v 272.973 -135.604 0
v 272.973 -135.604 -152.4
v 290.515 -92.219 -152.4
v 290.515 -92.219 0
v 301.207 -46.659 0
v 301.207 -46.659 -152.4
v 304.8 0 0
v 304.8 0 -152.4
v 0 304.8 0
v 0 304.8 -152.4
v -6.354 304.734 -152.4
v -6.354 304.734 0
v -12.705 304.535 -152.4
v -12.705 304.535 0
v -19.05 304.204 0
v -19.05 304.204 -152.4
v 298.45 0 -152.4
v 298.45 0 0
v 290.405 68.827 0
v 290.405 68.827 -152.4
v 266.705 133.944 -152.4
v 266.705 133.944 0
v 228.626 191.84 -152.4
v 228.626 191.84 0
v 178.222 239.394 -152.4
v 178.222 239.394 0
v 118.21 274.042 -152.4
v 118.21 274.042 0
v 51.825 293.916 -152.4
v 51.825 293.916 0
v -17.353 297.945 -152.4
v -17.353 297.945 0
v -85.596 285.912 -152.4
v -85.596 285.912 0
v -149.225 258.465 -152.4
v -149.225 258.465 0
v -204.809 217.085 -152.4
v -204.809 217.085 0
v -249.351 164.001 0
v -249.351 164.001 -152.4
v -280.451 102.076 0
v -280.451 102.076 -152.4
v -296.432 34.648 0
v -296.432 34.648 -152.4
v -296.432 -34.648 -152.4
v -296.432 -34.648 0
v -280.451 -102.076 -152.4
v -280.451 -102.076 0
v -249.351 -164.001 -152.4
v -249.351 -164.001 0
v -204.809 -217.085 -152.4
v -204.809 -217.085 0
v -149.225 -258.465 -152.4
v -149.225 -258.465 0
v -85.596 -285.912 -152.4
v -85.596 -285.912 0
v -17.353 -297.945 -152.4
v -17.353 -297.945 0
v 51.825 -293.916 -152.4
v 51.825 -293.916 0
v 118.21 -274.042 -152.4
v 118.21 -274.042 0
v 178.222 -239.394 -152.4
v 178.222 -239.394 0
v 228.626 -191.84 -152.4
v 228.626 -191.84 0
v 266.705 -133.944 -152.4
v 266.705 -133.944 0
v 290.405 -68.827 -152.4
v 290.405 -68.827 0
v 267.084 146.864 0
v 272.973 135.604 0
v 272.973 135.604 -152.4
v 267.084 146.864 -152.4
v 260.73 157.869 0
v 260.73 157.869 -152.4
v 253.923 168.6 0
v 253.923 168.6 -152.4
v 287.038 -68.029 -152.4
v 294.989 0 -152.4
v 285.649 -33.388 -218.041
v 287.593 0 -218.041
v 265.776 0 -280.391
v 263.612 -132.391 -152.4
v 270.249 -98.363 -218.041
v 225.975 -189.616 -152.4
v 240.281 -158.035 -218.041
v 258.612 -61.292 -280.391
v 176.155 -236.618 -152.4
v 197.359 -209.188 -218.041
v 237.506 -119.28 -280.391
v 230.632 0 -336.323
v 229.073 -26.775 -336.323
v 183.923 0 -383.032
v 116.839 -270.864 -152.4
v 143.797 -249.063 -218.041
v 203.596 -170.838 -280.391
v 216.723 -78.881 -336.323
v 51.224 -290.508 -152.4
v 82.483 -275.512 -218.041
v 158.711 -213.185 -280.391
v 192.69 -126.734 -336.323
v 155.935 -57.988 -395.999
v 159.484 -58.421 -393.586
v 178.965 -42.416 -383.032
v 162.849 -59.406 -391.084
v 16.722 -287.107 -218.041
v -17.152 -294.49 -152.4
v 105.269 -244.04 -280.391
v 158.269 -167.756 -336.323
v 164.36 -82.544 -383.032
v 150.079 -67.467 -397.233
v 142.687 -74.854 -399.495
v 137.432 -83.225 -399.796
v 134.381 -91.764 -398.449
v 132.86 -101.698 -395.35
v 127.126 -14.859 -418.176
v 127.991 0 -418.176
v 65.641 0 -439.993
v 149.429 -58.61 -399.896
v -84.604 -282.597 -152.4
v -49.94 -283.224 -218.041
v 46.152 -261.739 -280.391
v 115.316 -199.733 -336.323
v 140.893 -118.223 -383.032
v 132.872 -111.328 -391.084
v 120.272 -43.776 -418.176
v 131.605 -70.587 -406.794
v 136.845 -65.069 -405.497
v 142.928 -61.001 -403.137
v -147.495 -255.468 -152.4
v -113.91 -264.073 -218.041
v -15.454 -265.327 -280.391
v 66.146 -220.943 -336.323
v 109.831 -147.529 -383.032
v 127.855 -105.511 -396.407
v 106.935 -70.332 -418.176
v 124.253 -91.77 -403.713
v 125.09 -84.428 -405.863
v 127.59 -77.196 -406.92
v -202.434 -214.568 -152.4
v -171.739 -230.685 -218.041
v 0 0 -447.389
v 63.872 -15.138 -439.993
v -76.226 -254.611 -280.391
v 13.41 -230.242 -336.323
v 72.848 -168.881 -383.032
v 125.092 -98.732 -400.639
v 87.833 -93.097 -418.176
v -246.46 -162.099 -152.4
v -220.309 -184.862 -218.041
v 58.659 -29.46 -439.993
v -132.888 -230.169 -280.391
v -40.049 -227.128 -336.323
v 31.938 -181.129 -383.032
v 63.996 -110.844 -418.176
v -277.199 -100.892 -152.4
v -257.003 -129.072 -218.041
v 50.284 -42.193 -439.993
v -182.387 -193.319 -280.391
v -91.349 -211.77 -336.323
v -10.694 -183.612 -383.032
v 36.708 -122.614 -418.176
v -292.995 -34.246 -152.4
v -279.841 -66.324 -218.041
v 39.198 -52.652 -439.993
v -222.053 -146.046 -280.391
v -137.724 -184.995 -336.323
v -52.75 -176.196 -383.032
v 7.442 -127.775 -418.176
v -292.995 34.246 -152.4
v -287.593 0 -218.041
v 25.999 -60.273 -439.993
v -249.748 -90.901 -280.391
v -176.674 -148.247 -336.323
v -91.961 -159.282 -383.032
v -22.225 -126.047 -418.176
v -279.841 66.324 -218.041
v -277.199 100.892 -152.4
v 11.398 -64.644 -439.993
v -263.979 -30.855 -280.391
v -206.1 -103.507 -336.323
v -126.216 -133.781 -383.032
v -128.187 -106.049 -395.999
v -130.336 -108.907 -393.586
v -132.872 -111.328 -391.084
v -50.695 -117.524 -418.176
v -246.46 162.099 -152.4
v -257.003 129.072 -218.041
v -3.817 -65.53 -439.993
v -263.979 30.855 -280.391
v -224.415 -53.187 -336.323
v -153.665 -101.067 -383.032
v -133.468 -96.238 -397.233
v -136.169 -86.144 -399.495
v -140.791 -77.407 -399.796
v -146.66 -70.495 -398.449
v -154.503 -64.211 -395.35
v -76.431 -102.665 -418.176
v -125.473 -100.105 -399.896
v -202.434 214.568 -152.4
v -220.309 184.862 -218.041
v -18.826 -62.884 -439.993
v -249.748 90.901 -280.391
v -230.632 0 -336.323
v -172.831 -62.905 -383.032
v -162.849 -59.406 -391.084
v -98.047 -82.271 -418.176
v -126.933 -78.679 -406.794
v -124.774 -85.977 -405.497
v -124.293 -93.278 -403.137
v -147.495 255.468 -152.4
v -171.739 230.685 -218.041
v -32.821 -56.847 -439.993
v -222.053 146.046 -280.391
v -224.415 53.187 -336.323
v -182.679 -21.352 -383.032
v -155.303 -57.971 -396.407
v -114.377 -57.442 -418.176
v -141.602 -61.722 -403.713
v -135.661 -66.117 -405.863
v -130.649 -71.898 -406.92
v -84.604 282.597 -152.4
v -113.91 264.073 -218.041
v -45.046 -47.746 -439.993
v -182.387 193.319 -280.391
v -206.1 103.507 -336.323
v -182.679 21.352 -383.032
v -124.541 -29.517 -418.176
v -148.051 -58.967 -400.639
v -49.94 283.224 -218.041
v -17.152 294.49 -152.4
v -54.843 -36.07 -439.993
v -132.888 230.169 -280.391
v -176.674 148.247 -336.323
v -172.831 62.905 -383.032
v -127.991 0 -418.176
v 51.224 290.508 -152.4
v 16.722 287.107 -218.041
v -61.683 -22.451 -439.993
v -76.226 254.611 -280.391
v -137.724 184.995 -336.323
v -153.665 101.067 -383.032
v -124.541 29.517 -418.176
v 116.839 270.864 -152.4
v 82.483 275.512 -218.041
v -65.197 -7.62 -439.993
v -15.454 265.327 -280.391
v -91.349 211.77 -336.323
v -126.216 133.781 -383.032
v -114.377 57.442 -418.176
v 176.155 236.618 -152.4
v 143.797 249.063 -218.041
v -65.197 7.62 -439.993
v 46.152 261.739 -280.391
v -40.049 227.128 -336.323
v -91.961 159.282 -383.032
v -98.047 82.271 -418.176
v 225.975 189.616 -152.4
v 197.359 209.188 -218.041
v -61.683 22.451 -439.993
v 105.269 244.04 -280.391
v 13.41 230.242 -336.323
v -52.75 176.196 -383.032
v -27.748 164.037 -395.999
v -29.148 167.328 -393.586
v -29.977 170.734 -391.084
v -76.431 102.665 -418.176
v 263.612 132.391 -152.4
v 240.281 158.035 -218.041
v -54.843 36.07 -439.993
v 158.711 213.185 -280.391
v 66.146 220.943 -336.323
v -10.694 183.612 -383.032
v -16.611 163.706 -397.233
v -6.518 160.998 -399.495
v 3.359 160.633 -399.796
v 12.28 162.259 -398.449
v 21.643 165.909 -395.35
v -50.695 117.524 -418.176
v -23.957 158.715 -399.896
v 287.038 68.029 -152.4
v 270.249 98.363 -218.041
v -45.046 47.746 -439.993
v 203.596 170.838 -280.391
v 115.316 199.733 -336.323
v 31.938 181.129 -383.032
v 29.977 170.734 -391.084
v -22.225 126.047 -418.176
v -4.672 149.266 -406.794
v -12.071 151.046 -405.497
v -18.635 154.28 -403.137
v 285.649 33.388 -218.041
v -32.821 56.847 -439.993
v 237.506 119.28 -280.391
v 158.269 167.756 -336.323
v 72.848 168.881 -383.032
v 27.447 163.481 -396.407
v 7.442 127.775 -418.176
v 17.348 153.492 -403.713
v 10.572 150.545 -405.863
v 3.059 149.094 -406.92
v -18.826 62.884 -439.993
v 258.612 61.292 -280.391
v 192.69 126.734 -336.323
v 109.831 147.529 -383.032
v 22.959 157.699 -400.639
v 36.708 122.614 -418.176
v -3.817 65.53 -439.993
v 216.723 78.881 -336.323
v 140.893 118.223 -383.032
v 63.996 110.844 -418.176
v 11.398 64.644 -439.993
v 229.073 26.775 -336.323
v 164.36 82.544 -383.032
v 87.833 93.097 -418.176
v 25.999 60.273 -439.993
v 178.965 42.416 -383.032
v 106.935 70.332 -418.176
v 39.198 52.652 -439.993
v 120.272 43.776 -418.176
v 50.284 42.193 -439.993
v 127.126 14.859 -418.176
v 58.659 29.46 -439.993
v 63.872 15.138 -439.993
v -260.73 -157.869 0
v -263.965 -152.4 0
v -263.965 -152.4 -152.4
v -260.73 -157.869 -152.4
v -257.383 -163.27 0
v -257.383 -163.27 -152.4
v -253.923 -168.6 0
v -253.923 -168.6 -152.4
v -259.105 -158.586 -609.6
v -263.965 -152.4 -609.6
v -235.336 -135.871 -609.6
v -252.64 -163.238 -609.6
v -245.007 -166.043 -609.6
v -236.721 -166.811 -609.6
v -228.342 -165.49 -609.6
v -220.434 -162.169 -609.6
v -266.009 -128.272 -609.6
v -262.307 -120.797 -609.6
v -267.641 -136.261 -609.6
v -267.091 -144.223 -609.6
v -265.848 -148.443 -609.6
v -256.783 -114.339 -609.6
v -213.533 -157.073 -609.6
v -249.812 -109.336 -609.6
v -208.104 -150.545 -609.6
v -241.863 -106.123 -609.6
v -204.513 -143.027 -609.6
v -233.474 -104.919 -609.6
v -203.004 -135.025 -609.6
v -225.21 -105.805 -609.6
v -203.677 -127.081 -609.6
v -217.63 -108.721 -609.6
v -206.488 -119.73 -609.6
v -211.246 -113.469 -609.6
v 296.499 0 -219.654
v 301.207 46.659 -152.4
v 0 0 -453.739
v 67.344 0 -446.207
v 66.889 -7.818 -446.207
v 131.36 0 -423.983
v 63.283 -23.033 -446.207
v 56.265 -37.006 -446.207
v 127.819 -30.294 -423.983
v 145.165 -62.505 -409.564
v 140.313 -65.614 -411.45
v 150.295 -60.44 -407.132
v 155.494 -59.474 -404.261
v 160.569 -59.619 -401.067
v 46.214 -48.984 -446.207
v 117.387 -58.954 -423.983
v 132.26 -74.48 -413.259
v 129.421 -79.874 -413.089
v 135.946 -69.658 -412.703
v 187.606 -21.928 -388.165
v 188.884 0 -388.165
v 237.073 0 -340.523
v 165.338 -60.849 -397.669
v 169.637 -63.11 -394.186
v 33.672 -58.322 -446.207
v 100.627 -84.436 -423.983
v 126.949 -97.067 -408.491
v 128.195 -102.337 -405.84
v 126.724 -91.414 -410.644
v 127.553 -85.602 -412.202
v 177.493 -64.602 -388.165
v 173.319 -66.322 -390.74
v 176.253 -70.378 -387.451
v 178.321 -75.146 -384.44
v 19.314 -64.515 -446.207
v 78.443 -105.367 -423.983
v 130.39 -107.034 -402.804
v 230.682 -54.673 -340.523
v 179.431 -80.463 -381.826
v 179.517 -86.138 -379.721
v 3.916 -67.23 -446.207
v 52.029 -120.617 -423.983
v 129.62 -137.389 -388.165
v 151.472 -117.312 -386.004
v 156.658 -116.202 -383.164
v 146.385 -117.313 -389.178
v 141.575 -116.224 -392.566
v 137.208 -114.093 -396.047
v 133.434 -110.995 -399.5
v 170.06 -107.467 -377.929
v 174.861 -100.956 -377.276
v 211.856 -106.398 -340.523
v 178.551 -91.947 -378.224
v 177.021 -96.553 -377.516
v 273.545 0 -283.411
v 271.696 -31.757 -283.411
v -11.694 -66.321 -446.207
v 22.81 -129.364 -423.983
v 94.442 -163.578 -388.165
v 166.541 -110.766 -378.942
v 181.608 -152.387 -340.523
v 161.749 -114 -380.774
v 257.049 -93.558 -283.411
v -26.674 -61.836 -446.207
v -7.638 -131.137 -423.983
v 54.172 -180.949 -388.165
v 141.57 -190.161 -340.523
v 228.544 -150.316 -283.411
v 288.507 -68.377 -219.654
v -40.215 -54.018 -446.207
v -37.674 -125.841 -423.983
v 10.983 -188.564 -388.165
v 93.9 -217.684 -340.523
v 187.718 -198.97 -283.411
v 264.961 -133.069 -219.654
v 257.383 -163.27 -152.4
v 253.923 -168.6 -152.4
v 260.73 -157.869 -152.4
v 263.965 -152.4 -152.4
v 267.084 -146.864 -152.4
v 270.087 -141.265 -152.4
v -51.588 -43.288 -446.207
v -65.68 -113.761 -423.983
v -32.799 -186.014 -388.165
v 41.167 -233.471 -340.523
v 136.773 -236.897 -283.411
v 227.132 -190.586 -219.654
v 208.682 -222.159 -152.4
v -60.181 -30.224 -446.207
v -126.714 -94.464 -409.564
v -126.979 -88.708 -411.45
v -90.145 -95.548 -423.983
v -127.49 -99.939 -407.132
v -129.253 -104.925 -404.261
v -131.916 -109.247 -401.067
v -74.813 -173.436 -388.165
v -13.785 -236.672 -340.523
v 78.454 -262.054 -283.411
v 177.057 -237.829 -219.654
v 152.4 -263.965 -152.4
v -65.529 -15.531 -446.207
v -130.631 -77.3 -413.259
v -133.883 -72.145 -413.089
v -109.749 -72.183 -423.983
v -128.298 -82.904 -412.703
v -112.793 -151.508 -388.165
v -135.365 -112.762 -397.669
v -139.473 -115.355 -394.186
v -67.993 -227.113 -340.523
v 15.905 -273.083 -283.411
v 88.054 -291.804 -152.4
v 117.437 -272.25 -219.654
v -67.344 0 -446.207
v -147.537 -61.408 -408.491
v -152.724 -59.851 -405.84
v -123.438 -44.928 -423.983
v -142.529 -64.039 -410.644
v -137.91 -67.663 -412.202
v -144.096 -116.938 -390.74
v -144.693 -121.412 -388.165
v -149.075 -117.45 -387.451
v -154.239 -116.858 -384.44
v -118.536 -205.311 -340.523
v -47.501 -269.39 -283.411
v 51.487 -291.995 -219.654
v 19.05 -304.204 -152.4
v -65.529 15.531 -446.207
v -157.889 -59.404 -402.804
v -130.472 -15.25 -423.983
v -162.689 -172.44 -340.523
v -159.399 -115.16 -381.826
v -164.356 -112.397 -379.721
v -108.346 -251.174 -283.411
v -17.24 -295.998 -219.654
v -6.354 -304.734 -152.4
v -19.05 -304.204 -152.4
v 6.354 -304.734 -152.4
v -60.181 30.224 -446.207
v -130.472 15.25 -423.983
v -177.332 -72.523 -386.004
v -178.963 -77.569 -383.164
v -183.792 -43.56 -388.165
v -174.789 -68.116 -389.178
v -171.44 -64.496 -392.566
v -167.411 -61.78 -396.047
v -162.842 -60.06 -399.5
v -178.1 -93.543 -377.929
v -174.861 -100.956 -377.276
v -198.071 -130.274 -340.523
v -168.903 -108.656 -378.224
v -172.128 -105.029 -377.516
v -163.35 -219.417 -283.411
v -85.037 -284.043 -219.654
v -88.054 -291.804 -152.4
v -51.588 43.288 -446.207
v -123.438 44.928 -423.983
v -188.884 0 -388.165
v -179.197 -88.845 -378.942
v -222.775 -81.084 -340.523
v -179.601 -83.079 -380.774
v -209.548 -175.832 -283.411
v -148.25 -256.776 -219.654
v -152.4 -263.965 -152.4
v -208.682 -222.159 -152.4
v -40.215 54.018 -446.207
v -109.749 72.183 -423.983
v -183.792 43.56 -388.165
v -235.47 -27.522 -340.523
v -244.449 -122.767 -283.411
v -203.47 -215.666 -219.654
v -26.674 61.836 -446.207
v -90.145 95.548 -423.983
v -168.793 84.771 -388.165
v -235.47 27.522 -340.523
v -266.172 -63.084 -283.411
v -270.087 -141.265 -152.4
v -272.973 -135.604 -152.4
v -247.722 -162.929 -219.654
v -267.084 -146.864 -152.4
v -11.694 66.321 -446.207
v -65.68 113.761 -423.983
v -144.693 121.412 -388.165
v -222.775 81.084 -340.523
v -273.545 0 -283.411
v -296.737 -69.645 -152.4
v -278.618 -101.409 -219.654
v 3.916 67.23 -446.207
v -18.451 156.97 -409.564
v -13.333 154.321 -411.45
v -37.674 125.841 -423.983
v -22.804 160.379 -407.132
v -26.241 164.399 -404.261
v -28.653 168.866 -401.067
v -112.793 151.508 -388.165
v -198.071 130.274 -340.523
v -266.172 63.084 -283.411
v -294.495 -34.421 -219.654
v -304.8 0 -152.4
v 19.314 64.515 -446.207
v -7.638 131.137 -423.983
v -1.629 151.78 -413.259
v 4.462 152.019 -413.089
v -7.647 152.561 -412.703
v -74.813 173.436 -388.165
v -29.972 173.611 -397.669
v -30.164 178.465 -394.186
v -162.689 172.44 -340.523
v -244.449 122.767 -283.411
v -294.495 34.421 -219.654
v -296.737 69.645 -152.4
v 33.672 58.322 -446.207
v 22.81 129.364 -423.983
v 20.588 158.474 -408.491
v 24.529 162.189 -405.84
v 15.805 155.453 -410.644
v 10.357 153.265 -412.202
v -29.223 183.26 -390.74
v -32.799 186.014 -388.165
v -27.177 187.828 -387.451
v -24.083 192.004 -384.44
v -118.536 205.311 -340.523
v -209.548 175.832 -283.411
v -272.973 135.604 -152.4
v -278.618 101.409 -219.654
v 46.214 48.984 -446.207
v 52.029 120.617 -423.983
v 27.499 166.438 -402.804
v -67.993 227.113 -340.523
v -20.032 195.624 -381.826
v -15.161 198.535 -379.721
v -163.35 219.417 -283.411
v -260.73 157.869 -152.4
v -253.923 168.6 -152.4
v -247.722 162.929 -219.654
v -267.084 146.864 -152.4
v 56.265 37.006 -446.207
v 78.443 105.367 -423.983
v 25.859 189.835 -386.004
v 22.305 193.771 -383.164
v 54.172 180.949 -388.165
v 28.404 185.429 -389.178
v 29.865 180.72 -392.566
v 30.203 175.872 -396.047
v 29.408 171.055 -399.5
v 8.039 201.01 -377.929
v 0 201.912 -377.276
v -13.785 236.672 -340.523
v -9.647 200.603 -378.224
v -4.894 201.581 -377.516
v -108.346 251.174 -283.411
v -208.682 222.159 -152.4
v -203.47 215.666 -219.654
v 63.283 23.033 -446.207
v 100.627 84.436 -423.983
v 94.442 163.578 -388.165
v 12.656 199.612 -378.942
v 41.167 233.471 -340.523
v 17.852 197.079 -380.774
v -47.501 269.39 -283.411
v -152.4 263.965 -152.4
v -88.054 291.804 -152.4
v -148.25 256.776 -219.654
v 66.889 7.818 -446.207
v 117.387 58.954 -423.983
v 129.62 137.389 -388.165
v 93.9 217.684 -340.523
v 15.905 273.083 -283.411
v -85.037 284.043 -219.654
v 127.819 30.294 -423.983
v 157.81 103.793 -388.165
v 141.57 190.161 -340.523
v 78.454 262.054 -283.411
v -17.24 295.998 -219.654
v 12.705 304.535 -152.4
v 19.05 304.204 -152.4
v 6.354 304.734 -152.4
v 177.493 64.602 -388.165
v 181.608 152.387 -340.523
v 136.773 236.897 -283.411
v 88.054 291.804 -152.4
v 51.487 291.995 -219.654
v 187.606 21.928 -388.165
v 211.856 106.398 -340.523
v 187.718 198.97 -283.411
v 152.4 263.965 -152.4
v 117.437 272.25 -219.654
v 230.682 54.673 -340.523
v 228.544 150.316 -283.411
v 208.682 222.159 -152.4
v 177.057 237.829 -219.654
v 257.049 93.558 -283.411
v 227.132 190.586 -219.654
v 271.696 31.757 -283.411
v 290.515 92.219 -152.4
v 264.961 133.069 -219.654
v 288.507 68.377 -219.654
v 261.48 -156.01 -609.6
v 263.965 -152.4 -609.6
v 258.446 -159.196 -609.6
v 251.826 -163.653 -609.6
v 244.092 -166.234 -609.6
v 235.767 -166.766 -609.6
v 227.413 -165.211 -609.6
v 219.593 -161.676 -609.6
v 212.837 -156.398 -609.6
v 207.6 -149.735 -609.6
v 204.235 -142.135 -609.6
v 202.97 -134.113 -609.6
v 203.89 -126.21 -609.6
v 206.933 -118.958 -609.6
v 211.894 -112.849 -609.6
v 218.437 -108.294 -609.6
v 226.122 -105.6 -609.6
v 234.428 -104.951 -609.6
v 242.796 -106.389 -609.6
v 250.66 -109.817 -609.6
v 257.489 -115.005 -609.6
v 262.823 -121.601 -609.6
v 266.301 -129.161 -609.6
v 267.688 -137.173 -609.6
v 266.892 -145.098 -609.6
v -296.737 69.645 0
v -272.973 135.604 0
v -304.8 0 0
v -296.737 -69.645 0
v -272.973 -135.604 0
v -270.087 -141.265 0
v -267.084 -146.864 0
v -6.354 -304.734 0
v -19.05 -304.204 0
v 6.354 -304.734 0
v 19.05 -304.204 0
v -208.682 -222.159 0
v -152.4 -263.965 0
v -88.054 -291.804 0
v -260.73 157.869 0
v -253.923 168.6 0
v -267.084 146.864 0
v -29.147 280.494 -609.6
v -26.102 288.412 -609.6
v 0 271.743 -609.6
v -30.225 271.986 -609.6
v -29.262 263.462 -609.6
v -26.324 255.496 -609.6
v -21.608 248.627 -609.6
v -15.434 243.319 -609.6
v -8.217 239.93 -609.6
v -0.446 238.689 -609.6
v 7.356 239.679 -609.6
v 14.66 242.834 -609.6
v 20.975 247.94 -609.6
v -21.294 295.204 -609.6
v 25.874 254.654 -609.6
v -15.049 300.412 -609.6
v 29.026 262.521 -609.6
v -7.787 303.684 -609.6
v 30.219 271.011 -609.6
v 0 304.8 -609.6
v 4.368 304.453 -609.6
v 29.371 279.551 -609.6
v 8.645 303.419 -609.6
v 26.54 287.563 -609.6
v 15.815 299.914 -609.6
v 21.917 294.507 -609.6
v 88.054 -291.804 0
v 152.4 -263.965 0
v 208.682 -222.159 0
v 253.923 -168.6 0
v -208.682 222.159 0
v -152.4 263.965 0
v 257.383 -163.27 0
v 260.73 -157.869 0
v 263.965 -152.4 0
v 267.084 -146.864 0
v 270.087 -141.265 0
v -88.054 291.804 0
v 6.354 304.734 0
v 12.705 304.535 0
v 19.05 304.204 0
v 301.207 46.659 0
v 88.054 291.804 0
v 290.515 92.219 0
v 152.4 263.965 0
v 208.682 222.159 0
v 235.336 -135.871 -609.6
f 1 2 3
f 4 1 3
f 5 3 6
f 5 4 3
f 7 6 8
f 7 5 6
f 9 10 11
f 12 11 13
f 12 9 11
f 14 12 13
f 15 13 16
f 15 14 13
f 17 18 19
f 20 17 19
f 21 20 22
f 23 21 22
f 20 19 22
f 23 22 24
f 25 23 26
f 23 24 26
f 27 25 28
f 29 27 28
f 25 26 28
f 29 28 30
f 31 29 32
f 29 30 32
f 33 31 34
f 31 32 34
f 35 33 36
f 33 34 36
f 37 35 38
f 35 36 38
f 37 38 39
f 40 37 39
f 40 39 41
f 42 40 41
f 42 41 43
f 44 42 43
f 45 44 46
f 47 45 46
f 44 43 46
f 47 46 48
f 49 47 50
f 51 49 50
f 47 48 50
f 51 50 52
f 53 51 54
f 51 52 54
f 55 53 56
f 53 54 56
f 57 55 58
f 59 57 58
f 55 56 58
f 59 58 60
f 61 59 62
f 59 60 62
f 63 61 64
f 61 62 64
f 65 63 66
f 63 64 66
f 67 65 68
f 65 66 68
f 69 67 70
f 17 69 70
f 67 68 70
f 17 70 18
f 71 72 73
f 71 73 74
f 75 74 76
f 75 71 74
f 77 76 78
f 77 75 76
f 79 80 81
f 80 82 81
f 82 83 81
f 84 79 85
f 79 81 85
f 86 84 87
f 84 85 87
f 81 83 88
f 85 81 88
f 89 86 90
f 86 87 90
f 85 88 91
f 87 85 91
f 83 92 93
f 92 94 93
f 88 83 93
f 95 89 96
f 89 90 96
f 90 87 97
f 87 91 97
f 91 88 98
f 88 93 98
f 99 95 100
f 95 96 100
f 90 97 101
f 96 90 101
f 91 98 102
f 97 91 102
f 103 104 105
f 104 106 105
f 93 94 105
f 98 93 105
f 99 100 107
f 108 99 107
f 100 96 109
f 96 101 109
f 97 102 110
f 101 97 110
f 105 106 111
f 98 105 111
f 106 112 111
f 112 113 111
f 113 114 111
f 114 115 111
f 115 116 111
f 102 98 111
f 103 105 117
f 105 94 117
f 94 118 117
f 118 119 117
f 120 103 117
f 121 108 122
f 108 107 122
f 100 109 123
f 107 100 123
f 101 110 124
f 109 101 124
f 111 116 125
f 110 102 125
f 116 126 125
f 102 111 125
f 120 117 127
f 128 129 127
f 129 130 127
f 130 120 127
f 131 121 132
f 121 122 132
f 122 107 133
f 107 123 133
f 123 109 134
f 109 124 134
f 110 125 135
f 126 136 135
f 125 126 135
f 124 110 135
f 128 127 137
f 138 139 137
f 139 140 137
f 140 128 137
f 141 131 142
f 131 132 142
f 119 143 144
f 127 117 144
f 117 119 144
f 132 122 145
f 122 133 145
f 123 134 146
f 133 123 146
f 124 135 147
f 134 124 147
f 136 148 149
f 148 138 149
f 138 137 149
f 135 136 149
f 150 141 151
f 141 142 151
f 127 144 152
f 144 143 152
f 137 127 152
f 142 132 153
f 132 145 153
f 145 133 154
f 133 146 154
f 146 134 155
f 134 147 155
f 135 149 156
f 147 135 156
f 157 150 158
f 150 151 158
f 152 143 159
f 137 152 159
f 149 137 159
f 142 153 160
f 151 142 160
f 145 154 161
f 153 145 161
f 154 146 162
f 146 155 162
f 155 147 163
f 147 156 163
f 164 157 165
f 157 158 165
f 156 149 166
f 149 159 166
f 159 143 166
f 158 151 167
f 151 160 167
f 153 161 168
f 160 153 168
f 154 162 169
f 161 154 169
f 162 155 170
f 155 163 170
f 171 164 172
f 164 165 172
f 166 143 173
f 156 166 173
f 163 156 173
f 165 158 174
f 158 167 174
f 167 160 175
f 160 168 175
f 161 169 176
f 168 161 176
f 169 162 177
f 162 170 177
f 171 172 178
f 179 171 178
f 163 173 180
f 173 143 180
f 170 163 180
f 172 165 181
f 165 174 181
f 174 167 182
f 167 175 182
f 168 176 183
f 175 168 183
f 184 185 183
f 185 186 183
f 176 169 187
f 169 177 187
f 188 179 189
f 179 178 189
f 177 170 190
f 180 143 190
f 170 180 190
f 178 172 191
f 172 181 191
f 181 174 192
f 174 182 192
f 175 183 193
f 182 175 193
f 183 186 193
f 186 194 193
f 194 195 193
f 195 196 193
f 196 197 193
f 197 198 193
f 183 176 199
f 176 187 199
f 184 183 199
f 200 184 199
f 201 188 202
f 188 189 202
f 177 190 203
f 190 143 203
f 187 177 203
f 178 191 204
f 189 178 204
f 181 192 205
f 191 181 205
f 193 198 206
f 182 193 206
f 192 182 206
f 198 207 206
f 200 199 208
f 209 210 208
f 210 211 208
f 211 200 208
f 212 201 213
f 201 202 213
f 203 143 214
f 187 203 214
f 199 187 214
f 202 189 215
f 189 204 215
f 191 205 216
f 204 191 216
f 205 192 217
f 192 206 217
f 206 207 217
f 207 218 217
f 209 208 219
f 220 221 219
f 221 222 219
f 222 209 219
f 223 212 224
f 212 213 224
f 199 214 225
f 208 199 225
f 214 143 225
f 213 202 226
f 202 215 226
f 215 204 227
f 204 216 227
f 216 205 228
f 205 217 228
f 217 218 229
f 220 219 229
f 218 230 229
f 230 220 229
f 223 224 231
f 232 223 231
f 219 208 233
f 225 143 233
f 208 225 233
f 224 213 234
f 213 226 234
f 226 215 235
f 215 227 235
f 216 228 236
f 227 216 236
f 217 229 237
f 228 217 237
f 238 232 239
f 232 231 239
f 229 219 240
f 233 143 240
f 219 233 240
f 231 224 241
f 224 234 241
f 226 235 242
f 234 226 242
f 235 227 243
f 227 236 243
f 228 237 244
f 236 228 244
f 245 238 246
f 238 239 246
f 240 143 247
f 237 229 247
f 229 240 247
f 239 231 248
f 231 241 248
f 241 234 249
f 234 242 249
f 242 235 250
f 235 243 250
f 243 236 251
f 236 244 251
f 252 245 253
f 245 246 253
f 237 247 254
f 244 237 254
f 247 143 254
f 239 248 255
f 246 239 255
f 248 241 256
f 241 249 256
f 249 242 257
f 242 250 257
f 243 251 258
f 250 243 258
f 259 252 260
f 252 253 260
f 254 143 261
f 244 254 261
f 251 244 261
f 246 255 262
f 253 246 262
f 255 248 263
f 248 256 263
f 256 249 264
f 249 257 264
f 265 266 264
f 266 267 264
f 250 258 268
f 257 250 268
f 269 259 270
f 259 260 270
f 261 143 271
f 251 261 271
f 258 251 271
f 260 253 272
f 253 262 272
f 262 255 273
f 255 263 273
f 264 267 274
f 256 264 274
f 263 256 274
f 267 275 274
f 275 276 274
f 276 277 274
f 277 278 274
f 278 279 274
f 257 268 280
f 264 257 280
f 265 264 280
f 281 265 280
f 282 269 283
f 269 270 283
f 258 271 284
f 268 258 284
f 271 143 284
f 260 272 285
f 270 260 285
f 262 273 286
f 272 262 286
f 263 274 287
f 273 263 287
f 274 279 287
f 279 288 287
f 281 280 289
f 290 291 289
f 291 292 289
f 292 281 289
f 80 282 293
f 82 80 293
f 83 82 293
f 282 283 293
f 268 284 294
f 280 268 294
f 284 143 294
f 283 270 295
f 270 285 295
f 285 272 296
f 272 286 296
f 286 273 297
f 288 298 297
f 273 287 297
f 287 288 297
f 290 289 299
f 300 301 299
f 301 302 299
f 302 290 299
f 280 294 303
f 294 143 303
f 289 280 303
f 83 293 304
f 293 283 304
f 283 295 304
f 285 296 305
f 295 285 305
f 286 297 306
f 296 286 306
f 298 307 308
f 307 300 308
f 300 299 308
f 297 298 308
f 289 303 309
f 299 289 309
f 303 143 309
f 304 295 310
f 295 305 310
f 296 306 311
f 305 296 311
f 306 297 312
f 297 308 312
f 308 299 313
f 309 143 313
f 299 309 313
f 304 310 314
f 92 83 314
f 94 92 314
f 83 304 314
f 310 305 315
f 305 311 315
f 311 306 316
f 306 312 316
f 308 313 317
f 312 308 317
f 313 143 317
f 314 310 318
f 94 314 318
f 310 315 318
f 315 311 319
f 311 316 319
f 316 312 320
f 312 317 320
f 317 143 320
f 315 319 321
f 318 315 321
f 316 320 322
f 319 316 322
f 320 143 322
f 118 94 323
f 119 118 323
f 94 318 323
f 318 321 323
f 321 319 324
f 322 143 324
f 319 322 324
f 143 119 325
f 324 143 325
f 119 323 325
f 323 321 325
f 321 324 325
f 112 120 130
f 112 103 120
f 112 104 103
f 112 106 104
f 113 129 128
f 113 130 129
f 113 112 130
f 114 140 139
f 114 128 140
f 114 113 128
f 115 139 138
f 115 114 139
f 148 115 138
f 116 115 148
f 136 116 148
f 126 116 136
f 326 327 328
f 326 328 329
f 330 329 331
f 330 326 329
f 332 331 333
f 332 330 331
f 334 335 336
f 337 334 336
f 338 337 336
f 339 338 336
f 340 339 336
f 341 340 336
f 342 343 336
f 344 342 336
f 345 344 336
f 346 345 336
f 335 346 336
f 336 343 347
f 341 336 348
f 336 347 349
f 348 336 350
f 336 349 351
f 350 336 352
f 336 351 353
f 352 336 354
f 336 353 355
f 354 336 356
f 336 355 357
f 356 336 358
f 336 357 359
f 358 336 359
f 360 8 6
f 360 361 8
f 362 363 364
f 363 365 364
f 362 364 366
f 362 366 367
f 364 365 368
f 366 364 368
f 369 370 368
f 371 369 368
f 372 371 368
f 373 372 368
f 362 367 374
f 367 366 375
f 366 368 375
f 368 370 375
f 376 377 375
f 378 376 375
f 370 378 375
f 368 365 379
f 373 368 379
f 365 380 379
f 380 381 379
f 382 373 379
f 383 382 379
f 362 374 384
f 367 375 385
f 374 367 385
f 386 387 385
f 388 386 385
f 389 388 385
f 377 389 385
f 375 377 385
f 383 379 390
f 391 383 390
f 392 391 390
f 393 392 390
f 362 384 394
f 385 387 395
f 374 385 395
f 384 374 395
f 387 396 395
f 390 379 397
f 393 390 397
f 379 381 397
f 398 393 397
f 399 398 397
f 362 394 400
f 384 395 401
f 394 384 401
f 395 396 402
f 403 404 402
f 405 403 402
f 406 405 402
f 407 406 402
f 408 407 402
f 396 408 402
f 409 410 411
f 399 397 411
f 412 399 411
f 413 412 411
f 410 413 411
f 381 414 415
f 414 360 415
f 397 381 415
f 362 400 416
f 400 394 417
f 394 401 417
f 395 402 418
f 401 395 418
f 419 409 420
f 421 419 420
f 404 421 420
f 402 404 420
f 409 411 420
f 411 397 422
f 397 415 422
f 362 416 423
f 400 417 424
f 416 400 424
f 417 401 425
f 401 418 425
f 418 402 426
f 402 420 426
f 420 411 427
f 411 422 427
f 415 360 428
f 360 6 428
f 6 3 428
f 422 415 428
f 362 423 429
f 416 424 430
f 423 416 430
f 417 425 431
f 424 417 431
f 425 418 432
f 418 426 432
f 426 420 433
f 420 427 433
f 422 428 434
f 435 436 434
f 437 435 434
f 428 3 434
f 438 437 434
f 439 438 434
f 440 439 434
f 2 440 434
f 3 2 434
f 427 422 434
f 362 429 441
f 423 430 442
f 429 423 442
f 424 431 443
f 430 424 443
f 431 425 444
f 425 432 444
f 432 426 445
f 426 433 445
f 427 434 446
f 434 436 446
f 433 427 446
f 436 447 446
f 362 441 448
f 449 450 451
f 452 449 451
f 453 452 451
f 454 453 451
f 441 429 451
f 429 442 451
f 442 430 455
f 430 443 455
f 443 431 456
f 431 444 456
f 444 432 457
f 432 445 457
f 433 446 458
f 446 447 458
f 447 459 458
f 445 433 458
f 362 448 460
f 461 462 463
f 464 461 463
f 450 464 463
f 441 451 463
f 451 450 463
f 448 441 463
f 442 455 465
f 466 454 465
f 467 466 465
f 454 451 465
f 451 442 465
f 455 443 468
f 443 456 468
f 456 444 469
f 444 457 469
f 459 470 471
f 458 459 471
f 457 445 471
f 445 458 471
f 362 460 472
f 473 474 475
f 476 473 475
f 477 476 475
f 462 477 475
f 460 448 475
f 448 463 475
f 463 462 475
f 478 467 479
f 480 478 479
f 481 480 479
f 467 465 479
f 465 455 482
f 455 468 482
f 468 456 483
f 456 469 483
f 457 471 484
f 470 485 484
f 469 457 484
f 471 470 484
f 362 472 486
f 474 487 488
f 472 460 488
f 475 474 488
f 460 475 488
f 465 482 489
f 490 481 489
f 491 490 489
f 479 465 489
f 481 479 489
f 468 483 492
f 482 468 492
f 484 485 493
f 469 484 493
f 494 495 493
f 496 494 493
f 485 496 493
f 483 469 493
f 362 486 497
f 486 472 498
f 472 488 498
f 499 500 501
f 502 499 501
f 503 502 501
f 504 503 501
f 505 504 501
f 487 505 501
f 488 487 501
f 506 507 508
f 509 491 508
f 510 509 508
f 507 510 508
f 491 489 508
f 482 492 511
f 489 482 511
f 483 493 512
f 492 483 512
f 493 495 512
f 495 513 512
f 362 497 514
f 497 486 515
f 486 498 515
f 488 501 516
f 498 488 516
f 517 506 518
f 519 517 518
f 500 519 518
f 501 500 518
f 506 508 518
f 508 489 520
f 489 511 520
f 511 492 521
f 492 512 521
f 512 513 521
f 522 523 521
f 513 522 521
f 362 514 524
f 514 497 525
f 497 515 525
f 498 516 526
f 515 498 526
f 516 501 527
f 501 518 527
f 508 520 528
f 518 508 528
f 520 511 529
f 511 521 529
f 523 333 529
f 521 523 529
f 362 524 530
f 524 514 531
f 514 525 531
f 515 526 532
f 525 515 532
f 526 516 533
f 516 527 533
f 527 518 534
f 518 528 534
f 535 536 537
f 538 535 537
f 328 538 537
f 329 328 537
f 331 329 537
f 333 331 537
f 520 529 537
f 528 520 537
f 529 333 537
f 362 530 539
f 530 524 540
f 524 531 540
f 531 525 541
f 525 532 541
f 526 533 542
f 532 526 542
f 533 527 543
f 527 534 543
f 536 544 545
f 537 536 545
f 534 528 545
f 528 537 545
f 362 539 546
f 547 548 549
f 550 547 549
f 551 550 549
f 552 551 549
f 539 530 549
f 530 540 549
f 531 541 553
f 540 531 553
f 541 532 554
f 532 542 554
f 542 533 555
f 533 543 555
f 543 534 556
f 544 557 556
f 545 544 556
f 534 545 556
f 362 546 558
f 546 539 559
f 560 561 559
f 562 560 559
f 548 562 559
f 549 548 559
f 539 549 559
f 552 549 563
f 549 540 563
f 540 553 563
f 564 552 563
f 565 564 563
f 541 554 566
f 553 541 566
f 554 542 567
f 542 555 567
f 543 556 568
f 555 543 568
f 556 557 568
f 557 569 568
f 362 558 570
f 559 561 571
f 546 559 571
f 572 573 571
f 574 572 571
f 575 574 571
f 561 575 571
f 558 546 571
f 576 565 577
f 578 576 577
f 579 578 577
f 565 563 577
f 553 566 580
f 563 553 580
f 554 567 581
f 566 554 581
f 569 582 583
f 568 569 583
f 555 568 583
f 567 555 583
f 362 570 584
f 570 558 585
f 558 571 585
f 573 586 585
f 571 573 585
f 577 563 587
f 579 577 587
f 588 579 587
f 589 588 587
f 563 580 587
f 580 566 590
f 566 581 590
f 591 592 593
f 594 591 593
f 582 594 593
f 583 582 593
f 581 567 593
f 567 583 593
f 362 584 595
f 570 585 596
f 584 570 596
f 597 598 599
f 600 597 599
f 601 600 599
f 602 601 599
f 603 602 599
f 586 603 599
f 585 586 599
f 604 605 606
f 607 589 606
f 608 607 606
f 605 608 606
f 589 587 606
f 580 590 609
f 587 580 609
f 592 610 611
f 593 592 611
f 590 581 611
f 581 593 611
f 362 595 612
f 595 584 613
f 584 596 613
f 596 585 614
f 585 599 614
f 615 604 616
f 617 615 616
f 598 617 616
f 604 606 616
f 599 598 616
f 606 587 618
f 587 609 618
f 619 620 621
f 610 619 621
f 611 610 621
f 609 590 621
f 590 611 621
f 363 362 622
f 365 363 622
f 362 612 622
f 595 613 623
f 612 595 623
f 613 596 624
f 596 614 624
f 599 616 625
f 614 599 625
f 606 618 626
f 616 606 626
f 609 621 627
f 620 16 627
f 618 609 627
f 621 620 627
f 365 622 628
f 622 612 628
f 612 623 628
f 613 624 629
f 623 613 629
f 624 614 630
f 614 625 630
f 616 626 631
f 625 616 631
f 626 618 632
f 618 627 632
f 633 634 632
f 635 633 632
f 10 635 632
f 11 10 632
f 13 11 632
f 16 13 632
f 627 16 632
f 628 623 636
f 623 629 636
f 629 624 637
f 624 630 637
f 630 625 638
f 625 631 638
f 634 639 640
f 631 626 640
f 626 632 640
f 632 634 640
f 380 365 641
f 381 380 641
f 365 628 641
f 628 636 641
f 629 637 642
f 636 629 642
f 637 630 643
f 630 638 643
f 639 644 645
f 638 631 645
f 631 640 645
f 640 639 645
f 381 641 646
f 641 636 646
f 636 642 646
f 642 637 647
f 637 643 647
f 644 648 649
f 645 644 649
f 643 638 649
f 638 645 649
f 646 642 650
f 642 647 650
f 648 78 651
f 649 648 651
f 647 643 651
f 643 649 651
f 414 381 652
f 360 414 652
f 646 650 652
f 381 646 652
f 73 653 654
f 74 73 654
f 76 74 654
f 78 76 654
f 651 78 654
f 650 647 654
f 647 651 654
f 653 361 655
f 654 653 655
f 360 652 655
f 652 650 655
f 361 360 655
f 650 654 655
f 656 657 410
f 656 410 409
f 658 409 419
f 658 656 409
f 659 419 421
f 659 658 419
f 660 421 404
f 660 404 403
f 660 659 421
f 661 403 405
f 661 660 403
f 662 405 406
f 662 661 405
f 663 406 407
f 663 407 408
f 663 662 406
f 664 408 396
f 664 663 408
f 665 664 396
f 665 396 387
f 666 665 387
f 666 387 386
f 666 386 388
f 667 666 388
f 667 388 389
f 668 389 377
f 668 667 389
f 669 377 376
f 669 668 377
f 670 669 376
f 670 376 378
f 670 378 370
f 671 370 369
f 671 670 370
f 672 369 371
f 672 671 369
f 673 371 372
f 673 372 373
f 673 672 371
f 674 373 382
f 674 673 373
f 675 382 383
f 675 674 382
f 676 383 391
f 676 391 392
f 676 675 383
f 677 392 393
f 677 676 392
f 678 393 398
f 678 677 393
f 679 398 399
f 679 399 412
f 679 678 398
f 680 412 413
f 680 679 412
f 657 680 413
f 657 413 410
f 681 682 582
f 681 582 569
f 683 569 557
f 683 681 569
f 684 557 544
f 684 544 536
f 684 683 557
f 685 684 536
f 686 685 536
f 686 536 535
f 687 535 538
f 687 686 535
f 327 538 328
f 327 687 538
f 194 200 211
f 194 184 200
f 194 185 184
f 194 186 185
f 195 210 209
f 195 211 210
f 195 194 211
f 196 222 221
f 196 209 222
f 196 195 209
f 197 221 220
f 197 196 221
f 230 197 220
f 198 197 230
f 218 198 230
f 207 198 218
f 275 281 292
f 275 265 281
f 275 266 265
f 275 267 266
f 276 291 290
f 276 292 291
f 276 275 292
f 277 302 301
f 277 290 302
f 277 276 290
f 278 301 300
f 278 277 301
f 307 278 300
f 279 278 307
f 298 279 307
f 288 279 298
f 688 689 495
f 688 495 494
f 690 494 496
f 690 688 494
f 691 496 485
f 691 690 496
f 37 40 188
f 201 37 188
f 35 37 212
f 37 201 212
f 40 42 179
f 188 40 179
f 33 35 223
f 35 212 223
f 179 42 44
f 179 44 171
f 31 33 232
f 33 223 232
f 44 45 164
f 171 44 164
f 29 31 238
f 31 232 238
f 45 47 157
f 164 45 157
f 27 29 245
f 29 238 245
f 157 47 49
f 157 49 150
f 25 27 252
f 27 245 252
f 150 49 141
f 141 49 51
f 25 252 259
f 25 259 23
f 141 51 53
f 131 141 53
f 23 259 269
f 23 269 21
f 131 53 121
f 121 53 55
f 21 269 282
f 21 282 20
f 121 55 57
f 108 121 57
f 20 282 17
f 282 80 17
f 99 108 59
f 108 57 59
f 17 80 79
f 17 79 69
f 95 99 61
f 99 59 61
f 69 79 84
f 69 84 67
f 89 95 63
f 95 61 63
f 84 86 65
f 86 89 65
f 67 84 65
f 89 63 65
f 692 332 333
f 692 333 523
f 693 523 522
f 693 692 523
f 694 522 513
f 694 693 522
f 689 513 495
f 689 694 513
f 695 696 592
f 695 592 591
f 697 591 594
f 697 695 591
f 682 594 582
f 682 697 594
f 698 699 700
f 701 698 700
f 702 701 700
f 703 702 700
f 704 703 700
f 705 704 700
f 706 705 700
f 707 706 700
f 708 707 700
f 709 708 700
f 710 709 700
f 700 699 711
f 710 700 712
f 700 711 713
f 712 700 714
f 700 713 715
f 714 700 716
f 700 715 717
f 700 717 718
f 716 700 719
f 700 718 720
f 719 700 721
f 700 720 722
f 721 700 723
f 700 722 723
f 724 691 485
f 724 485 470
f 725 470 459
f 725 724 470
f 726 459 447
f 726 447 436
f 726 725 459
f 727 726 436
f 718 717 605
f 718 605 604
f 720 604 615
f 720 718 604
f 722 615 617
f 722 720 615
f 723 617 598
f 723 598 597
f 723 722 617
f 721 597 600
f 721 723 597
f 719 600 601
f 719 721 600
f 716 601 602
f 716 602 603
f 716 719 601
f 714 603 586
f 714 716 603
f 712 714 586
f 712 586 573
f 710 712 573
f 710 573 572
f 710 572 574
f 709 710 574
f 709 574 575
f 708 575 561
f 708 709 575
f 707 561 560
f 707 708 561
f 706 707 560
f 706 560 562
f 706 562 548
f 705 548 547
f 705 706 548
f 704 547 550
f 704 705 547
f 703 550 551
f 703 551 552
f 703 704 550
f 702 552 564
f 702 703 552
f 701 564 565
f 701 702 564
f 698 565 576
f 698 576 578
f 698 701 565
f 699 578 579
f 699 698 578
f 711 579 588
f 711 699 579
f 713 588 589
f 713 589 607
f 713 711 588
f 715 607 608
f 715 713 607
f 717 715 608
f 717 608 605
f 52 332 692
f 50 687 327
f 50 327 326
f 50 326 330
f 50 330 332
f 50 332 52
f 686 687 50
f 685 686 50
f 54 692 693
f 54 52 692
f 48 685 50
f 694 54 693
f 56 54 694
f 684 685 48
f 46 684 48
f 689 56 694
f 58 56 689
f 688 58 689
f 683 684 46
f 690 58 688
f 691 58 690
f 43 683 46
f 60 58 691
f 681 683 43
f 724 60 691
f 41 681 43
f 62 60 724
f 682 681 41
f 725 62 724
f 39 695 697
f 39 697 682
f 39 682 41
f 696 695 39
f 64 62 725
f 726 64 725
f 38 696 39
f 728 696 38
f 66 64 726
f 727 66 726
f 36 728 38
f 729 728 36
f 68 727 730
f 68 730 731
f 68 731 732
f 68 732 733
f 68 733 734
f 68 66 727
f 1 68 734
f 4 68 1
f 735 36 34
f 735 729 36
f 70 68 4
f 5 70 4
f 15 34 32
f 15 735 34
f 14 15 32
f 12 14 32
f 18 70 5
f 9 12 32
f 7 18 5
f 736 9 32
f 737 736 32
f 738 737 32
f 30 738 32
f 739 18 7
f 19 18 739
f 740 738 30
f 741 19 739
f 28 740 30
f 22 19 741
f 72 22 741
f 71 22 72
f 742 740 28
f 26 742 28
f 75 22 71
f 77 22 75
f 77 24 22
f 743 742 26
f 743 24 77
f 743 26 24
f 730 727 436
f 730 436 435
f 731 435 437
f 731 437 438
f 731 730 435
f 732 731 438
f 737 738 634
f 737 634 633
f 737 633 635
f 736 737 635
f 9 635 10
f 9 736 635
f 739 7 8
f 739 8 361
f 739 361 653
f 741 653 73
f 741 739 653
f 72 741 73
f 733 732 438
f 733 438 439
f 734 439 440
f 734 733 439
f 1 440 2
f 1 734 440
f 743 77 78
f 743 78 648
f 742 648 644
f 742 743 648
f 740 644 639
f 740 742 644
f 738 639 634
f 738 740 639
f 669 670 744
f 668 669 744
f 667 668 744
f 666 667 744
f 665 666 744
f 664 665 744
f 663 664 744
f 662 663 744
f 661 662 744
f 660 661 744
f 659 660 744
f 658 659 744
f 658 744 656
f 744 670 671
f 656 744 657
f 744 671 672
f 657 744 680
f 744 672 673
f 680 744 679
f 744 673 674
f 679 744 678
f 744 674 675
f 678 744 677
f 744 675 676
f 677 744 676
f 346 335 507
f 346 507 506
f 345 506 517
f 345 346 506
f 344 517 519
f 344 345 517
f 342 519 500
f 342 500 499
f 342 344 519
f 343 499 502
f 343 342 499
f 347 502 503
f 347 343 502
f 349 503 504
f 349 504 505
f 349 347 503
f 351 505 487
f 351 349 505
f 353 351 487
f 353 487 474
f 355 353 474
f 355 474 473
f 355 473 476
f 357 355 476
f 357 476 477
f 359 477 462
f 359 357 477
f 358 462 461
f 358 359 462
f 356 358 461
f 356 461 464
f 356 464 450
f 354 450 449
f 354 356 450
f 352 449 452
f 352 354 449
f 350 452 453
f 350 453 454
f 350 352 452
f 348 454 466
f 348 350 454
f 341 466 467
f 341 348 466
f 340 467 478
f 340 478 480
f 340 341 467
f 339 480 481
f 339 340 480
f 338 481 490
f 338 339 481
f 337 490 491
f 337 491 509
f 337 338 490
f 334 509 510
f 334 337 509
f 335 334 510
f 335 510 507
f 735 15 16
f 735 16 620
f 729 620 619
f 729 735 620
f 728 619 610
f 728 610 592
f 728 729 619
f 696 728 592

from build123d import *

# Parameters (mm, degrees)
F0_R      = 298.45
F1_DEPTH  = 152.4
F11_W     = 1267.8290780676
F11_H     = 1016
F16_DEPTH = 76.2


with BuildPart() as f1:
    # F0 (on Top) → F1 (new body)
    with BuildSketch(Plane.XY):
        with BuildLine():
            ThreePointArc((272.9734828671, 135.6042685589), (263.9645430735, 152.4), (253.9234828671, 168.599836443))
            ThreePointArc((253.9234828671, 168.599836443), (152.4, 263.9645430735), (19.05, 304.2041050019))
            ThreePointArc((19.05, 304.2041050019), (9.5296588455, 304.6509898265), (0, 304.8))
            ThreePointArc((0, 304.8), (-9.5296588455, 304.6509898265), (-19.05, 304.2041050019))
            ThreePointArc((-19.05, 304.2041050019), (-152.4, 263.9645430735), (-253.9234828671, 168.599836443))
            ThreePointArc((-253.9234828671, 168.599836443), (-263.9645430735, 152.4), (-272.9734828671, 135.6042685589))
            ThreePointArc((-272.9734828671, 135.6042685589), (-304.8, 0), (-272.9734828671, -135.6042685589))
            ThreePointArc((-272.9734828671, -135.6042685589), (-268.6003259006, -144.0725682636), (-263.9645430735, -152.4))
            ThreePointArc((-263.9645430735, -152.4), (-259.0706670551, -160.5784215629), (-253.9234828671, -168.599836443))
            ThreePointArc((-253.9234828671, -168.599836443), (-152.4, -263.9645430735), (-19.05, -304.2041050019))
            ThreePointArc((-19.05, -304.2041050019), (0, -304.8), (19.05, -304.2041050019))
            ThreePointArc((19.05, -304.2041050019), (152.4, -263.9645430735), (253.9234828671, -168.599836443))
            ThreePointArc((253.9234828671, -168.599836443), (259.0706670551, -160.5784215629), (263.9645430735, -152.4))
            ThreePointArc((263.9645430735, -152.4), (268.6003259006, -144.0725682636), (272.9734828671, -135.6042685589))
            ThreePointArc((272.9734828671, -135.6042685589), (296.7367162805, -69.6445346818), (304.8, 0))
            ThreePointArc((304.8, 0), (296.7367162805, 69.6445346818), (272.9734828671, 135.6042685589))
        make_face()
        Circle(F0_R, mode=Mode.SUBTRACT)
    extrude(amount=-F1_DEPTH)

    # F2 (on Front) → F9 (revolve)
    with BuildSketch(Plane.XZ):
        with BuildLine():
            Line((0, -447.3894571287), (0, -453.7394571287))
            ThreePointArc((0, -453.7394571287), (214.306152748, -365.6868034652), (304.8, -152.4))
            Line((304.8, -152.4), (294.9894571287, -152.4))
            ThreePointArc((294.9894571287, -152.4), (208.5890455143, -360.9890455142), (0, -447.3894571287))
        make_face()
    revolve(axis=Axis((0, 0, -248.1805924326), (0, 0, -1)))

    # F8 (on face) → F12 (revolve)
    with BuildSketch(Plane(origin=(0, 0, 0), x_dir=(0, -1, 0), z_dir=(-1, 0, 0))):
        with BuildLine():
            Line((-201.9116809095, -377.2763831548), (-304.8, -609.6))
            Line((-304.8, -609.6), (-271.7425017268, -609.6))
            Line((-271.7425017268, -609.6), (-177.4761269208, -396.7448835454))
            ThreePointArc((-177.4761269208, -396.7448835454), (-189.9434989923, -387.3239083256), (-201.9116809095, -377.2763831548))
        make_face()
    revolve(axis=Axis((0, 136.6116201303, -304.4721153432), (0, 0.4049332191, -0.9143462627)))

    # F7 (on face) → F13 (revolve)
    with BuildSketch(Plane(origin=(0, 0, 0), x_dir=(-0.8660254038, 0.5, 0), z_dir=(0.5, 0.8660254038, 0))):
        with BuildLine():
            Line((-201.9116809095, -377.2763831548), (-304.8, -609.6))
            Line((-304.8, -609.6), (-271.7425017268, -609.6))
            Line((-271.7425017268, -609.6), (-177.4761269208, -396.7448835454))
            ThreePointArc((-177.4761269208, -396.7448835454), (-189.9434989923, -387.3239083256), (-201.9116809095, -377.2763831548))
        make_face()
    revolve(axis=Axis((118.309133485, -68.3058100652, -304.4721153432), (0.3506824545, -0.2024666095, -0.9143462627)))

    # F6 (on face) → F14 (revolve)
    with BuildSketch(Plane(origin=(0, 0, 0), x_dir=(0.8660254038, 0.5, 0), z_dir=(0.5, -0.8660254038, 0))):
        with BuildLine():
            Line((-201.9116809095, -377.2763831548), (-304.8, -609.6))
            Line((-304.8, -609.6), (-271.7425017268, -609.6))
            Line((-271.7425017268, -609.6), (-177.4761269208, -396.7448835454))
            ThreePointArc((-177.4761269208, -396.7448835454), (-189.9434989923, -387.3239083256), (-201.9116809095, -377.2763831548))
        make_face()
    revolve(axis=Axis((-118.309133485, -68.3058100652, -304.4721153432), (-0.3506824545, -0.2024666095, -0.9143462627)))

    # F2 (on Front) → F15 (revolve, cut)
    with BuildSketch(Plane.XZ):
        with BuildLine():
            Line((0, -152.4), (0, -447.3894571287))
            ThreePointArc((0, -447.3894571287), (208.5890455143, -360.9890455142), (294.9894571287, -152.4))
            Line((294.9894571287, -152.4), (0, -152.4))
        make_face()
    revolve(axis=Axis((0, 0, -248.1805924326), (0, 0, -1)), mode=Mode.SUBTRACT)

    # F11 (on offset) → F16 (cut)
    with BuildSketch(Plane.XY.offset(-609.6)):
        with Locations((7.6045542955, -77.3831754923)):
            Rectangle(F11_W, F11_H)
    extrude(amount=-F16_DEPTH, mode=Mode.SUBTRACT)


solid = f1.part
